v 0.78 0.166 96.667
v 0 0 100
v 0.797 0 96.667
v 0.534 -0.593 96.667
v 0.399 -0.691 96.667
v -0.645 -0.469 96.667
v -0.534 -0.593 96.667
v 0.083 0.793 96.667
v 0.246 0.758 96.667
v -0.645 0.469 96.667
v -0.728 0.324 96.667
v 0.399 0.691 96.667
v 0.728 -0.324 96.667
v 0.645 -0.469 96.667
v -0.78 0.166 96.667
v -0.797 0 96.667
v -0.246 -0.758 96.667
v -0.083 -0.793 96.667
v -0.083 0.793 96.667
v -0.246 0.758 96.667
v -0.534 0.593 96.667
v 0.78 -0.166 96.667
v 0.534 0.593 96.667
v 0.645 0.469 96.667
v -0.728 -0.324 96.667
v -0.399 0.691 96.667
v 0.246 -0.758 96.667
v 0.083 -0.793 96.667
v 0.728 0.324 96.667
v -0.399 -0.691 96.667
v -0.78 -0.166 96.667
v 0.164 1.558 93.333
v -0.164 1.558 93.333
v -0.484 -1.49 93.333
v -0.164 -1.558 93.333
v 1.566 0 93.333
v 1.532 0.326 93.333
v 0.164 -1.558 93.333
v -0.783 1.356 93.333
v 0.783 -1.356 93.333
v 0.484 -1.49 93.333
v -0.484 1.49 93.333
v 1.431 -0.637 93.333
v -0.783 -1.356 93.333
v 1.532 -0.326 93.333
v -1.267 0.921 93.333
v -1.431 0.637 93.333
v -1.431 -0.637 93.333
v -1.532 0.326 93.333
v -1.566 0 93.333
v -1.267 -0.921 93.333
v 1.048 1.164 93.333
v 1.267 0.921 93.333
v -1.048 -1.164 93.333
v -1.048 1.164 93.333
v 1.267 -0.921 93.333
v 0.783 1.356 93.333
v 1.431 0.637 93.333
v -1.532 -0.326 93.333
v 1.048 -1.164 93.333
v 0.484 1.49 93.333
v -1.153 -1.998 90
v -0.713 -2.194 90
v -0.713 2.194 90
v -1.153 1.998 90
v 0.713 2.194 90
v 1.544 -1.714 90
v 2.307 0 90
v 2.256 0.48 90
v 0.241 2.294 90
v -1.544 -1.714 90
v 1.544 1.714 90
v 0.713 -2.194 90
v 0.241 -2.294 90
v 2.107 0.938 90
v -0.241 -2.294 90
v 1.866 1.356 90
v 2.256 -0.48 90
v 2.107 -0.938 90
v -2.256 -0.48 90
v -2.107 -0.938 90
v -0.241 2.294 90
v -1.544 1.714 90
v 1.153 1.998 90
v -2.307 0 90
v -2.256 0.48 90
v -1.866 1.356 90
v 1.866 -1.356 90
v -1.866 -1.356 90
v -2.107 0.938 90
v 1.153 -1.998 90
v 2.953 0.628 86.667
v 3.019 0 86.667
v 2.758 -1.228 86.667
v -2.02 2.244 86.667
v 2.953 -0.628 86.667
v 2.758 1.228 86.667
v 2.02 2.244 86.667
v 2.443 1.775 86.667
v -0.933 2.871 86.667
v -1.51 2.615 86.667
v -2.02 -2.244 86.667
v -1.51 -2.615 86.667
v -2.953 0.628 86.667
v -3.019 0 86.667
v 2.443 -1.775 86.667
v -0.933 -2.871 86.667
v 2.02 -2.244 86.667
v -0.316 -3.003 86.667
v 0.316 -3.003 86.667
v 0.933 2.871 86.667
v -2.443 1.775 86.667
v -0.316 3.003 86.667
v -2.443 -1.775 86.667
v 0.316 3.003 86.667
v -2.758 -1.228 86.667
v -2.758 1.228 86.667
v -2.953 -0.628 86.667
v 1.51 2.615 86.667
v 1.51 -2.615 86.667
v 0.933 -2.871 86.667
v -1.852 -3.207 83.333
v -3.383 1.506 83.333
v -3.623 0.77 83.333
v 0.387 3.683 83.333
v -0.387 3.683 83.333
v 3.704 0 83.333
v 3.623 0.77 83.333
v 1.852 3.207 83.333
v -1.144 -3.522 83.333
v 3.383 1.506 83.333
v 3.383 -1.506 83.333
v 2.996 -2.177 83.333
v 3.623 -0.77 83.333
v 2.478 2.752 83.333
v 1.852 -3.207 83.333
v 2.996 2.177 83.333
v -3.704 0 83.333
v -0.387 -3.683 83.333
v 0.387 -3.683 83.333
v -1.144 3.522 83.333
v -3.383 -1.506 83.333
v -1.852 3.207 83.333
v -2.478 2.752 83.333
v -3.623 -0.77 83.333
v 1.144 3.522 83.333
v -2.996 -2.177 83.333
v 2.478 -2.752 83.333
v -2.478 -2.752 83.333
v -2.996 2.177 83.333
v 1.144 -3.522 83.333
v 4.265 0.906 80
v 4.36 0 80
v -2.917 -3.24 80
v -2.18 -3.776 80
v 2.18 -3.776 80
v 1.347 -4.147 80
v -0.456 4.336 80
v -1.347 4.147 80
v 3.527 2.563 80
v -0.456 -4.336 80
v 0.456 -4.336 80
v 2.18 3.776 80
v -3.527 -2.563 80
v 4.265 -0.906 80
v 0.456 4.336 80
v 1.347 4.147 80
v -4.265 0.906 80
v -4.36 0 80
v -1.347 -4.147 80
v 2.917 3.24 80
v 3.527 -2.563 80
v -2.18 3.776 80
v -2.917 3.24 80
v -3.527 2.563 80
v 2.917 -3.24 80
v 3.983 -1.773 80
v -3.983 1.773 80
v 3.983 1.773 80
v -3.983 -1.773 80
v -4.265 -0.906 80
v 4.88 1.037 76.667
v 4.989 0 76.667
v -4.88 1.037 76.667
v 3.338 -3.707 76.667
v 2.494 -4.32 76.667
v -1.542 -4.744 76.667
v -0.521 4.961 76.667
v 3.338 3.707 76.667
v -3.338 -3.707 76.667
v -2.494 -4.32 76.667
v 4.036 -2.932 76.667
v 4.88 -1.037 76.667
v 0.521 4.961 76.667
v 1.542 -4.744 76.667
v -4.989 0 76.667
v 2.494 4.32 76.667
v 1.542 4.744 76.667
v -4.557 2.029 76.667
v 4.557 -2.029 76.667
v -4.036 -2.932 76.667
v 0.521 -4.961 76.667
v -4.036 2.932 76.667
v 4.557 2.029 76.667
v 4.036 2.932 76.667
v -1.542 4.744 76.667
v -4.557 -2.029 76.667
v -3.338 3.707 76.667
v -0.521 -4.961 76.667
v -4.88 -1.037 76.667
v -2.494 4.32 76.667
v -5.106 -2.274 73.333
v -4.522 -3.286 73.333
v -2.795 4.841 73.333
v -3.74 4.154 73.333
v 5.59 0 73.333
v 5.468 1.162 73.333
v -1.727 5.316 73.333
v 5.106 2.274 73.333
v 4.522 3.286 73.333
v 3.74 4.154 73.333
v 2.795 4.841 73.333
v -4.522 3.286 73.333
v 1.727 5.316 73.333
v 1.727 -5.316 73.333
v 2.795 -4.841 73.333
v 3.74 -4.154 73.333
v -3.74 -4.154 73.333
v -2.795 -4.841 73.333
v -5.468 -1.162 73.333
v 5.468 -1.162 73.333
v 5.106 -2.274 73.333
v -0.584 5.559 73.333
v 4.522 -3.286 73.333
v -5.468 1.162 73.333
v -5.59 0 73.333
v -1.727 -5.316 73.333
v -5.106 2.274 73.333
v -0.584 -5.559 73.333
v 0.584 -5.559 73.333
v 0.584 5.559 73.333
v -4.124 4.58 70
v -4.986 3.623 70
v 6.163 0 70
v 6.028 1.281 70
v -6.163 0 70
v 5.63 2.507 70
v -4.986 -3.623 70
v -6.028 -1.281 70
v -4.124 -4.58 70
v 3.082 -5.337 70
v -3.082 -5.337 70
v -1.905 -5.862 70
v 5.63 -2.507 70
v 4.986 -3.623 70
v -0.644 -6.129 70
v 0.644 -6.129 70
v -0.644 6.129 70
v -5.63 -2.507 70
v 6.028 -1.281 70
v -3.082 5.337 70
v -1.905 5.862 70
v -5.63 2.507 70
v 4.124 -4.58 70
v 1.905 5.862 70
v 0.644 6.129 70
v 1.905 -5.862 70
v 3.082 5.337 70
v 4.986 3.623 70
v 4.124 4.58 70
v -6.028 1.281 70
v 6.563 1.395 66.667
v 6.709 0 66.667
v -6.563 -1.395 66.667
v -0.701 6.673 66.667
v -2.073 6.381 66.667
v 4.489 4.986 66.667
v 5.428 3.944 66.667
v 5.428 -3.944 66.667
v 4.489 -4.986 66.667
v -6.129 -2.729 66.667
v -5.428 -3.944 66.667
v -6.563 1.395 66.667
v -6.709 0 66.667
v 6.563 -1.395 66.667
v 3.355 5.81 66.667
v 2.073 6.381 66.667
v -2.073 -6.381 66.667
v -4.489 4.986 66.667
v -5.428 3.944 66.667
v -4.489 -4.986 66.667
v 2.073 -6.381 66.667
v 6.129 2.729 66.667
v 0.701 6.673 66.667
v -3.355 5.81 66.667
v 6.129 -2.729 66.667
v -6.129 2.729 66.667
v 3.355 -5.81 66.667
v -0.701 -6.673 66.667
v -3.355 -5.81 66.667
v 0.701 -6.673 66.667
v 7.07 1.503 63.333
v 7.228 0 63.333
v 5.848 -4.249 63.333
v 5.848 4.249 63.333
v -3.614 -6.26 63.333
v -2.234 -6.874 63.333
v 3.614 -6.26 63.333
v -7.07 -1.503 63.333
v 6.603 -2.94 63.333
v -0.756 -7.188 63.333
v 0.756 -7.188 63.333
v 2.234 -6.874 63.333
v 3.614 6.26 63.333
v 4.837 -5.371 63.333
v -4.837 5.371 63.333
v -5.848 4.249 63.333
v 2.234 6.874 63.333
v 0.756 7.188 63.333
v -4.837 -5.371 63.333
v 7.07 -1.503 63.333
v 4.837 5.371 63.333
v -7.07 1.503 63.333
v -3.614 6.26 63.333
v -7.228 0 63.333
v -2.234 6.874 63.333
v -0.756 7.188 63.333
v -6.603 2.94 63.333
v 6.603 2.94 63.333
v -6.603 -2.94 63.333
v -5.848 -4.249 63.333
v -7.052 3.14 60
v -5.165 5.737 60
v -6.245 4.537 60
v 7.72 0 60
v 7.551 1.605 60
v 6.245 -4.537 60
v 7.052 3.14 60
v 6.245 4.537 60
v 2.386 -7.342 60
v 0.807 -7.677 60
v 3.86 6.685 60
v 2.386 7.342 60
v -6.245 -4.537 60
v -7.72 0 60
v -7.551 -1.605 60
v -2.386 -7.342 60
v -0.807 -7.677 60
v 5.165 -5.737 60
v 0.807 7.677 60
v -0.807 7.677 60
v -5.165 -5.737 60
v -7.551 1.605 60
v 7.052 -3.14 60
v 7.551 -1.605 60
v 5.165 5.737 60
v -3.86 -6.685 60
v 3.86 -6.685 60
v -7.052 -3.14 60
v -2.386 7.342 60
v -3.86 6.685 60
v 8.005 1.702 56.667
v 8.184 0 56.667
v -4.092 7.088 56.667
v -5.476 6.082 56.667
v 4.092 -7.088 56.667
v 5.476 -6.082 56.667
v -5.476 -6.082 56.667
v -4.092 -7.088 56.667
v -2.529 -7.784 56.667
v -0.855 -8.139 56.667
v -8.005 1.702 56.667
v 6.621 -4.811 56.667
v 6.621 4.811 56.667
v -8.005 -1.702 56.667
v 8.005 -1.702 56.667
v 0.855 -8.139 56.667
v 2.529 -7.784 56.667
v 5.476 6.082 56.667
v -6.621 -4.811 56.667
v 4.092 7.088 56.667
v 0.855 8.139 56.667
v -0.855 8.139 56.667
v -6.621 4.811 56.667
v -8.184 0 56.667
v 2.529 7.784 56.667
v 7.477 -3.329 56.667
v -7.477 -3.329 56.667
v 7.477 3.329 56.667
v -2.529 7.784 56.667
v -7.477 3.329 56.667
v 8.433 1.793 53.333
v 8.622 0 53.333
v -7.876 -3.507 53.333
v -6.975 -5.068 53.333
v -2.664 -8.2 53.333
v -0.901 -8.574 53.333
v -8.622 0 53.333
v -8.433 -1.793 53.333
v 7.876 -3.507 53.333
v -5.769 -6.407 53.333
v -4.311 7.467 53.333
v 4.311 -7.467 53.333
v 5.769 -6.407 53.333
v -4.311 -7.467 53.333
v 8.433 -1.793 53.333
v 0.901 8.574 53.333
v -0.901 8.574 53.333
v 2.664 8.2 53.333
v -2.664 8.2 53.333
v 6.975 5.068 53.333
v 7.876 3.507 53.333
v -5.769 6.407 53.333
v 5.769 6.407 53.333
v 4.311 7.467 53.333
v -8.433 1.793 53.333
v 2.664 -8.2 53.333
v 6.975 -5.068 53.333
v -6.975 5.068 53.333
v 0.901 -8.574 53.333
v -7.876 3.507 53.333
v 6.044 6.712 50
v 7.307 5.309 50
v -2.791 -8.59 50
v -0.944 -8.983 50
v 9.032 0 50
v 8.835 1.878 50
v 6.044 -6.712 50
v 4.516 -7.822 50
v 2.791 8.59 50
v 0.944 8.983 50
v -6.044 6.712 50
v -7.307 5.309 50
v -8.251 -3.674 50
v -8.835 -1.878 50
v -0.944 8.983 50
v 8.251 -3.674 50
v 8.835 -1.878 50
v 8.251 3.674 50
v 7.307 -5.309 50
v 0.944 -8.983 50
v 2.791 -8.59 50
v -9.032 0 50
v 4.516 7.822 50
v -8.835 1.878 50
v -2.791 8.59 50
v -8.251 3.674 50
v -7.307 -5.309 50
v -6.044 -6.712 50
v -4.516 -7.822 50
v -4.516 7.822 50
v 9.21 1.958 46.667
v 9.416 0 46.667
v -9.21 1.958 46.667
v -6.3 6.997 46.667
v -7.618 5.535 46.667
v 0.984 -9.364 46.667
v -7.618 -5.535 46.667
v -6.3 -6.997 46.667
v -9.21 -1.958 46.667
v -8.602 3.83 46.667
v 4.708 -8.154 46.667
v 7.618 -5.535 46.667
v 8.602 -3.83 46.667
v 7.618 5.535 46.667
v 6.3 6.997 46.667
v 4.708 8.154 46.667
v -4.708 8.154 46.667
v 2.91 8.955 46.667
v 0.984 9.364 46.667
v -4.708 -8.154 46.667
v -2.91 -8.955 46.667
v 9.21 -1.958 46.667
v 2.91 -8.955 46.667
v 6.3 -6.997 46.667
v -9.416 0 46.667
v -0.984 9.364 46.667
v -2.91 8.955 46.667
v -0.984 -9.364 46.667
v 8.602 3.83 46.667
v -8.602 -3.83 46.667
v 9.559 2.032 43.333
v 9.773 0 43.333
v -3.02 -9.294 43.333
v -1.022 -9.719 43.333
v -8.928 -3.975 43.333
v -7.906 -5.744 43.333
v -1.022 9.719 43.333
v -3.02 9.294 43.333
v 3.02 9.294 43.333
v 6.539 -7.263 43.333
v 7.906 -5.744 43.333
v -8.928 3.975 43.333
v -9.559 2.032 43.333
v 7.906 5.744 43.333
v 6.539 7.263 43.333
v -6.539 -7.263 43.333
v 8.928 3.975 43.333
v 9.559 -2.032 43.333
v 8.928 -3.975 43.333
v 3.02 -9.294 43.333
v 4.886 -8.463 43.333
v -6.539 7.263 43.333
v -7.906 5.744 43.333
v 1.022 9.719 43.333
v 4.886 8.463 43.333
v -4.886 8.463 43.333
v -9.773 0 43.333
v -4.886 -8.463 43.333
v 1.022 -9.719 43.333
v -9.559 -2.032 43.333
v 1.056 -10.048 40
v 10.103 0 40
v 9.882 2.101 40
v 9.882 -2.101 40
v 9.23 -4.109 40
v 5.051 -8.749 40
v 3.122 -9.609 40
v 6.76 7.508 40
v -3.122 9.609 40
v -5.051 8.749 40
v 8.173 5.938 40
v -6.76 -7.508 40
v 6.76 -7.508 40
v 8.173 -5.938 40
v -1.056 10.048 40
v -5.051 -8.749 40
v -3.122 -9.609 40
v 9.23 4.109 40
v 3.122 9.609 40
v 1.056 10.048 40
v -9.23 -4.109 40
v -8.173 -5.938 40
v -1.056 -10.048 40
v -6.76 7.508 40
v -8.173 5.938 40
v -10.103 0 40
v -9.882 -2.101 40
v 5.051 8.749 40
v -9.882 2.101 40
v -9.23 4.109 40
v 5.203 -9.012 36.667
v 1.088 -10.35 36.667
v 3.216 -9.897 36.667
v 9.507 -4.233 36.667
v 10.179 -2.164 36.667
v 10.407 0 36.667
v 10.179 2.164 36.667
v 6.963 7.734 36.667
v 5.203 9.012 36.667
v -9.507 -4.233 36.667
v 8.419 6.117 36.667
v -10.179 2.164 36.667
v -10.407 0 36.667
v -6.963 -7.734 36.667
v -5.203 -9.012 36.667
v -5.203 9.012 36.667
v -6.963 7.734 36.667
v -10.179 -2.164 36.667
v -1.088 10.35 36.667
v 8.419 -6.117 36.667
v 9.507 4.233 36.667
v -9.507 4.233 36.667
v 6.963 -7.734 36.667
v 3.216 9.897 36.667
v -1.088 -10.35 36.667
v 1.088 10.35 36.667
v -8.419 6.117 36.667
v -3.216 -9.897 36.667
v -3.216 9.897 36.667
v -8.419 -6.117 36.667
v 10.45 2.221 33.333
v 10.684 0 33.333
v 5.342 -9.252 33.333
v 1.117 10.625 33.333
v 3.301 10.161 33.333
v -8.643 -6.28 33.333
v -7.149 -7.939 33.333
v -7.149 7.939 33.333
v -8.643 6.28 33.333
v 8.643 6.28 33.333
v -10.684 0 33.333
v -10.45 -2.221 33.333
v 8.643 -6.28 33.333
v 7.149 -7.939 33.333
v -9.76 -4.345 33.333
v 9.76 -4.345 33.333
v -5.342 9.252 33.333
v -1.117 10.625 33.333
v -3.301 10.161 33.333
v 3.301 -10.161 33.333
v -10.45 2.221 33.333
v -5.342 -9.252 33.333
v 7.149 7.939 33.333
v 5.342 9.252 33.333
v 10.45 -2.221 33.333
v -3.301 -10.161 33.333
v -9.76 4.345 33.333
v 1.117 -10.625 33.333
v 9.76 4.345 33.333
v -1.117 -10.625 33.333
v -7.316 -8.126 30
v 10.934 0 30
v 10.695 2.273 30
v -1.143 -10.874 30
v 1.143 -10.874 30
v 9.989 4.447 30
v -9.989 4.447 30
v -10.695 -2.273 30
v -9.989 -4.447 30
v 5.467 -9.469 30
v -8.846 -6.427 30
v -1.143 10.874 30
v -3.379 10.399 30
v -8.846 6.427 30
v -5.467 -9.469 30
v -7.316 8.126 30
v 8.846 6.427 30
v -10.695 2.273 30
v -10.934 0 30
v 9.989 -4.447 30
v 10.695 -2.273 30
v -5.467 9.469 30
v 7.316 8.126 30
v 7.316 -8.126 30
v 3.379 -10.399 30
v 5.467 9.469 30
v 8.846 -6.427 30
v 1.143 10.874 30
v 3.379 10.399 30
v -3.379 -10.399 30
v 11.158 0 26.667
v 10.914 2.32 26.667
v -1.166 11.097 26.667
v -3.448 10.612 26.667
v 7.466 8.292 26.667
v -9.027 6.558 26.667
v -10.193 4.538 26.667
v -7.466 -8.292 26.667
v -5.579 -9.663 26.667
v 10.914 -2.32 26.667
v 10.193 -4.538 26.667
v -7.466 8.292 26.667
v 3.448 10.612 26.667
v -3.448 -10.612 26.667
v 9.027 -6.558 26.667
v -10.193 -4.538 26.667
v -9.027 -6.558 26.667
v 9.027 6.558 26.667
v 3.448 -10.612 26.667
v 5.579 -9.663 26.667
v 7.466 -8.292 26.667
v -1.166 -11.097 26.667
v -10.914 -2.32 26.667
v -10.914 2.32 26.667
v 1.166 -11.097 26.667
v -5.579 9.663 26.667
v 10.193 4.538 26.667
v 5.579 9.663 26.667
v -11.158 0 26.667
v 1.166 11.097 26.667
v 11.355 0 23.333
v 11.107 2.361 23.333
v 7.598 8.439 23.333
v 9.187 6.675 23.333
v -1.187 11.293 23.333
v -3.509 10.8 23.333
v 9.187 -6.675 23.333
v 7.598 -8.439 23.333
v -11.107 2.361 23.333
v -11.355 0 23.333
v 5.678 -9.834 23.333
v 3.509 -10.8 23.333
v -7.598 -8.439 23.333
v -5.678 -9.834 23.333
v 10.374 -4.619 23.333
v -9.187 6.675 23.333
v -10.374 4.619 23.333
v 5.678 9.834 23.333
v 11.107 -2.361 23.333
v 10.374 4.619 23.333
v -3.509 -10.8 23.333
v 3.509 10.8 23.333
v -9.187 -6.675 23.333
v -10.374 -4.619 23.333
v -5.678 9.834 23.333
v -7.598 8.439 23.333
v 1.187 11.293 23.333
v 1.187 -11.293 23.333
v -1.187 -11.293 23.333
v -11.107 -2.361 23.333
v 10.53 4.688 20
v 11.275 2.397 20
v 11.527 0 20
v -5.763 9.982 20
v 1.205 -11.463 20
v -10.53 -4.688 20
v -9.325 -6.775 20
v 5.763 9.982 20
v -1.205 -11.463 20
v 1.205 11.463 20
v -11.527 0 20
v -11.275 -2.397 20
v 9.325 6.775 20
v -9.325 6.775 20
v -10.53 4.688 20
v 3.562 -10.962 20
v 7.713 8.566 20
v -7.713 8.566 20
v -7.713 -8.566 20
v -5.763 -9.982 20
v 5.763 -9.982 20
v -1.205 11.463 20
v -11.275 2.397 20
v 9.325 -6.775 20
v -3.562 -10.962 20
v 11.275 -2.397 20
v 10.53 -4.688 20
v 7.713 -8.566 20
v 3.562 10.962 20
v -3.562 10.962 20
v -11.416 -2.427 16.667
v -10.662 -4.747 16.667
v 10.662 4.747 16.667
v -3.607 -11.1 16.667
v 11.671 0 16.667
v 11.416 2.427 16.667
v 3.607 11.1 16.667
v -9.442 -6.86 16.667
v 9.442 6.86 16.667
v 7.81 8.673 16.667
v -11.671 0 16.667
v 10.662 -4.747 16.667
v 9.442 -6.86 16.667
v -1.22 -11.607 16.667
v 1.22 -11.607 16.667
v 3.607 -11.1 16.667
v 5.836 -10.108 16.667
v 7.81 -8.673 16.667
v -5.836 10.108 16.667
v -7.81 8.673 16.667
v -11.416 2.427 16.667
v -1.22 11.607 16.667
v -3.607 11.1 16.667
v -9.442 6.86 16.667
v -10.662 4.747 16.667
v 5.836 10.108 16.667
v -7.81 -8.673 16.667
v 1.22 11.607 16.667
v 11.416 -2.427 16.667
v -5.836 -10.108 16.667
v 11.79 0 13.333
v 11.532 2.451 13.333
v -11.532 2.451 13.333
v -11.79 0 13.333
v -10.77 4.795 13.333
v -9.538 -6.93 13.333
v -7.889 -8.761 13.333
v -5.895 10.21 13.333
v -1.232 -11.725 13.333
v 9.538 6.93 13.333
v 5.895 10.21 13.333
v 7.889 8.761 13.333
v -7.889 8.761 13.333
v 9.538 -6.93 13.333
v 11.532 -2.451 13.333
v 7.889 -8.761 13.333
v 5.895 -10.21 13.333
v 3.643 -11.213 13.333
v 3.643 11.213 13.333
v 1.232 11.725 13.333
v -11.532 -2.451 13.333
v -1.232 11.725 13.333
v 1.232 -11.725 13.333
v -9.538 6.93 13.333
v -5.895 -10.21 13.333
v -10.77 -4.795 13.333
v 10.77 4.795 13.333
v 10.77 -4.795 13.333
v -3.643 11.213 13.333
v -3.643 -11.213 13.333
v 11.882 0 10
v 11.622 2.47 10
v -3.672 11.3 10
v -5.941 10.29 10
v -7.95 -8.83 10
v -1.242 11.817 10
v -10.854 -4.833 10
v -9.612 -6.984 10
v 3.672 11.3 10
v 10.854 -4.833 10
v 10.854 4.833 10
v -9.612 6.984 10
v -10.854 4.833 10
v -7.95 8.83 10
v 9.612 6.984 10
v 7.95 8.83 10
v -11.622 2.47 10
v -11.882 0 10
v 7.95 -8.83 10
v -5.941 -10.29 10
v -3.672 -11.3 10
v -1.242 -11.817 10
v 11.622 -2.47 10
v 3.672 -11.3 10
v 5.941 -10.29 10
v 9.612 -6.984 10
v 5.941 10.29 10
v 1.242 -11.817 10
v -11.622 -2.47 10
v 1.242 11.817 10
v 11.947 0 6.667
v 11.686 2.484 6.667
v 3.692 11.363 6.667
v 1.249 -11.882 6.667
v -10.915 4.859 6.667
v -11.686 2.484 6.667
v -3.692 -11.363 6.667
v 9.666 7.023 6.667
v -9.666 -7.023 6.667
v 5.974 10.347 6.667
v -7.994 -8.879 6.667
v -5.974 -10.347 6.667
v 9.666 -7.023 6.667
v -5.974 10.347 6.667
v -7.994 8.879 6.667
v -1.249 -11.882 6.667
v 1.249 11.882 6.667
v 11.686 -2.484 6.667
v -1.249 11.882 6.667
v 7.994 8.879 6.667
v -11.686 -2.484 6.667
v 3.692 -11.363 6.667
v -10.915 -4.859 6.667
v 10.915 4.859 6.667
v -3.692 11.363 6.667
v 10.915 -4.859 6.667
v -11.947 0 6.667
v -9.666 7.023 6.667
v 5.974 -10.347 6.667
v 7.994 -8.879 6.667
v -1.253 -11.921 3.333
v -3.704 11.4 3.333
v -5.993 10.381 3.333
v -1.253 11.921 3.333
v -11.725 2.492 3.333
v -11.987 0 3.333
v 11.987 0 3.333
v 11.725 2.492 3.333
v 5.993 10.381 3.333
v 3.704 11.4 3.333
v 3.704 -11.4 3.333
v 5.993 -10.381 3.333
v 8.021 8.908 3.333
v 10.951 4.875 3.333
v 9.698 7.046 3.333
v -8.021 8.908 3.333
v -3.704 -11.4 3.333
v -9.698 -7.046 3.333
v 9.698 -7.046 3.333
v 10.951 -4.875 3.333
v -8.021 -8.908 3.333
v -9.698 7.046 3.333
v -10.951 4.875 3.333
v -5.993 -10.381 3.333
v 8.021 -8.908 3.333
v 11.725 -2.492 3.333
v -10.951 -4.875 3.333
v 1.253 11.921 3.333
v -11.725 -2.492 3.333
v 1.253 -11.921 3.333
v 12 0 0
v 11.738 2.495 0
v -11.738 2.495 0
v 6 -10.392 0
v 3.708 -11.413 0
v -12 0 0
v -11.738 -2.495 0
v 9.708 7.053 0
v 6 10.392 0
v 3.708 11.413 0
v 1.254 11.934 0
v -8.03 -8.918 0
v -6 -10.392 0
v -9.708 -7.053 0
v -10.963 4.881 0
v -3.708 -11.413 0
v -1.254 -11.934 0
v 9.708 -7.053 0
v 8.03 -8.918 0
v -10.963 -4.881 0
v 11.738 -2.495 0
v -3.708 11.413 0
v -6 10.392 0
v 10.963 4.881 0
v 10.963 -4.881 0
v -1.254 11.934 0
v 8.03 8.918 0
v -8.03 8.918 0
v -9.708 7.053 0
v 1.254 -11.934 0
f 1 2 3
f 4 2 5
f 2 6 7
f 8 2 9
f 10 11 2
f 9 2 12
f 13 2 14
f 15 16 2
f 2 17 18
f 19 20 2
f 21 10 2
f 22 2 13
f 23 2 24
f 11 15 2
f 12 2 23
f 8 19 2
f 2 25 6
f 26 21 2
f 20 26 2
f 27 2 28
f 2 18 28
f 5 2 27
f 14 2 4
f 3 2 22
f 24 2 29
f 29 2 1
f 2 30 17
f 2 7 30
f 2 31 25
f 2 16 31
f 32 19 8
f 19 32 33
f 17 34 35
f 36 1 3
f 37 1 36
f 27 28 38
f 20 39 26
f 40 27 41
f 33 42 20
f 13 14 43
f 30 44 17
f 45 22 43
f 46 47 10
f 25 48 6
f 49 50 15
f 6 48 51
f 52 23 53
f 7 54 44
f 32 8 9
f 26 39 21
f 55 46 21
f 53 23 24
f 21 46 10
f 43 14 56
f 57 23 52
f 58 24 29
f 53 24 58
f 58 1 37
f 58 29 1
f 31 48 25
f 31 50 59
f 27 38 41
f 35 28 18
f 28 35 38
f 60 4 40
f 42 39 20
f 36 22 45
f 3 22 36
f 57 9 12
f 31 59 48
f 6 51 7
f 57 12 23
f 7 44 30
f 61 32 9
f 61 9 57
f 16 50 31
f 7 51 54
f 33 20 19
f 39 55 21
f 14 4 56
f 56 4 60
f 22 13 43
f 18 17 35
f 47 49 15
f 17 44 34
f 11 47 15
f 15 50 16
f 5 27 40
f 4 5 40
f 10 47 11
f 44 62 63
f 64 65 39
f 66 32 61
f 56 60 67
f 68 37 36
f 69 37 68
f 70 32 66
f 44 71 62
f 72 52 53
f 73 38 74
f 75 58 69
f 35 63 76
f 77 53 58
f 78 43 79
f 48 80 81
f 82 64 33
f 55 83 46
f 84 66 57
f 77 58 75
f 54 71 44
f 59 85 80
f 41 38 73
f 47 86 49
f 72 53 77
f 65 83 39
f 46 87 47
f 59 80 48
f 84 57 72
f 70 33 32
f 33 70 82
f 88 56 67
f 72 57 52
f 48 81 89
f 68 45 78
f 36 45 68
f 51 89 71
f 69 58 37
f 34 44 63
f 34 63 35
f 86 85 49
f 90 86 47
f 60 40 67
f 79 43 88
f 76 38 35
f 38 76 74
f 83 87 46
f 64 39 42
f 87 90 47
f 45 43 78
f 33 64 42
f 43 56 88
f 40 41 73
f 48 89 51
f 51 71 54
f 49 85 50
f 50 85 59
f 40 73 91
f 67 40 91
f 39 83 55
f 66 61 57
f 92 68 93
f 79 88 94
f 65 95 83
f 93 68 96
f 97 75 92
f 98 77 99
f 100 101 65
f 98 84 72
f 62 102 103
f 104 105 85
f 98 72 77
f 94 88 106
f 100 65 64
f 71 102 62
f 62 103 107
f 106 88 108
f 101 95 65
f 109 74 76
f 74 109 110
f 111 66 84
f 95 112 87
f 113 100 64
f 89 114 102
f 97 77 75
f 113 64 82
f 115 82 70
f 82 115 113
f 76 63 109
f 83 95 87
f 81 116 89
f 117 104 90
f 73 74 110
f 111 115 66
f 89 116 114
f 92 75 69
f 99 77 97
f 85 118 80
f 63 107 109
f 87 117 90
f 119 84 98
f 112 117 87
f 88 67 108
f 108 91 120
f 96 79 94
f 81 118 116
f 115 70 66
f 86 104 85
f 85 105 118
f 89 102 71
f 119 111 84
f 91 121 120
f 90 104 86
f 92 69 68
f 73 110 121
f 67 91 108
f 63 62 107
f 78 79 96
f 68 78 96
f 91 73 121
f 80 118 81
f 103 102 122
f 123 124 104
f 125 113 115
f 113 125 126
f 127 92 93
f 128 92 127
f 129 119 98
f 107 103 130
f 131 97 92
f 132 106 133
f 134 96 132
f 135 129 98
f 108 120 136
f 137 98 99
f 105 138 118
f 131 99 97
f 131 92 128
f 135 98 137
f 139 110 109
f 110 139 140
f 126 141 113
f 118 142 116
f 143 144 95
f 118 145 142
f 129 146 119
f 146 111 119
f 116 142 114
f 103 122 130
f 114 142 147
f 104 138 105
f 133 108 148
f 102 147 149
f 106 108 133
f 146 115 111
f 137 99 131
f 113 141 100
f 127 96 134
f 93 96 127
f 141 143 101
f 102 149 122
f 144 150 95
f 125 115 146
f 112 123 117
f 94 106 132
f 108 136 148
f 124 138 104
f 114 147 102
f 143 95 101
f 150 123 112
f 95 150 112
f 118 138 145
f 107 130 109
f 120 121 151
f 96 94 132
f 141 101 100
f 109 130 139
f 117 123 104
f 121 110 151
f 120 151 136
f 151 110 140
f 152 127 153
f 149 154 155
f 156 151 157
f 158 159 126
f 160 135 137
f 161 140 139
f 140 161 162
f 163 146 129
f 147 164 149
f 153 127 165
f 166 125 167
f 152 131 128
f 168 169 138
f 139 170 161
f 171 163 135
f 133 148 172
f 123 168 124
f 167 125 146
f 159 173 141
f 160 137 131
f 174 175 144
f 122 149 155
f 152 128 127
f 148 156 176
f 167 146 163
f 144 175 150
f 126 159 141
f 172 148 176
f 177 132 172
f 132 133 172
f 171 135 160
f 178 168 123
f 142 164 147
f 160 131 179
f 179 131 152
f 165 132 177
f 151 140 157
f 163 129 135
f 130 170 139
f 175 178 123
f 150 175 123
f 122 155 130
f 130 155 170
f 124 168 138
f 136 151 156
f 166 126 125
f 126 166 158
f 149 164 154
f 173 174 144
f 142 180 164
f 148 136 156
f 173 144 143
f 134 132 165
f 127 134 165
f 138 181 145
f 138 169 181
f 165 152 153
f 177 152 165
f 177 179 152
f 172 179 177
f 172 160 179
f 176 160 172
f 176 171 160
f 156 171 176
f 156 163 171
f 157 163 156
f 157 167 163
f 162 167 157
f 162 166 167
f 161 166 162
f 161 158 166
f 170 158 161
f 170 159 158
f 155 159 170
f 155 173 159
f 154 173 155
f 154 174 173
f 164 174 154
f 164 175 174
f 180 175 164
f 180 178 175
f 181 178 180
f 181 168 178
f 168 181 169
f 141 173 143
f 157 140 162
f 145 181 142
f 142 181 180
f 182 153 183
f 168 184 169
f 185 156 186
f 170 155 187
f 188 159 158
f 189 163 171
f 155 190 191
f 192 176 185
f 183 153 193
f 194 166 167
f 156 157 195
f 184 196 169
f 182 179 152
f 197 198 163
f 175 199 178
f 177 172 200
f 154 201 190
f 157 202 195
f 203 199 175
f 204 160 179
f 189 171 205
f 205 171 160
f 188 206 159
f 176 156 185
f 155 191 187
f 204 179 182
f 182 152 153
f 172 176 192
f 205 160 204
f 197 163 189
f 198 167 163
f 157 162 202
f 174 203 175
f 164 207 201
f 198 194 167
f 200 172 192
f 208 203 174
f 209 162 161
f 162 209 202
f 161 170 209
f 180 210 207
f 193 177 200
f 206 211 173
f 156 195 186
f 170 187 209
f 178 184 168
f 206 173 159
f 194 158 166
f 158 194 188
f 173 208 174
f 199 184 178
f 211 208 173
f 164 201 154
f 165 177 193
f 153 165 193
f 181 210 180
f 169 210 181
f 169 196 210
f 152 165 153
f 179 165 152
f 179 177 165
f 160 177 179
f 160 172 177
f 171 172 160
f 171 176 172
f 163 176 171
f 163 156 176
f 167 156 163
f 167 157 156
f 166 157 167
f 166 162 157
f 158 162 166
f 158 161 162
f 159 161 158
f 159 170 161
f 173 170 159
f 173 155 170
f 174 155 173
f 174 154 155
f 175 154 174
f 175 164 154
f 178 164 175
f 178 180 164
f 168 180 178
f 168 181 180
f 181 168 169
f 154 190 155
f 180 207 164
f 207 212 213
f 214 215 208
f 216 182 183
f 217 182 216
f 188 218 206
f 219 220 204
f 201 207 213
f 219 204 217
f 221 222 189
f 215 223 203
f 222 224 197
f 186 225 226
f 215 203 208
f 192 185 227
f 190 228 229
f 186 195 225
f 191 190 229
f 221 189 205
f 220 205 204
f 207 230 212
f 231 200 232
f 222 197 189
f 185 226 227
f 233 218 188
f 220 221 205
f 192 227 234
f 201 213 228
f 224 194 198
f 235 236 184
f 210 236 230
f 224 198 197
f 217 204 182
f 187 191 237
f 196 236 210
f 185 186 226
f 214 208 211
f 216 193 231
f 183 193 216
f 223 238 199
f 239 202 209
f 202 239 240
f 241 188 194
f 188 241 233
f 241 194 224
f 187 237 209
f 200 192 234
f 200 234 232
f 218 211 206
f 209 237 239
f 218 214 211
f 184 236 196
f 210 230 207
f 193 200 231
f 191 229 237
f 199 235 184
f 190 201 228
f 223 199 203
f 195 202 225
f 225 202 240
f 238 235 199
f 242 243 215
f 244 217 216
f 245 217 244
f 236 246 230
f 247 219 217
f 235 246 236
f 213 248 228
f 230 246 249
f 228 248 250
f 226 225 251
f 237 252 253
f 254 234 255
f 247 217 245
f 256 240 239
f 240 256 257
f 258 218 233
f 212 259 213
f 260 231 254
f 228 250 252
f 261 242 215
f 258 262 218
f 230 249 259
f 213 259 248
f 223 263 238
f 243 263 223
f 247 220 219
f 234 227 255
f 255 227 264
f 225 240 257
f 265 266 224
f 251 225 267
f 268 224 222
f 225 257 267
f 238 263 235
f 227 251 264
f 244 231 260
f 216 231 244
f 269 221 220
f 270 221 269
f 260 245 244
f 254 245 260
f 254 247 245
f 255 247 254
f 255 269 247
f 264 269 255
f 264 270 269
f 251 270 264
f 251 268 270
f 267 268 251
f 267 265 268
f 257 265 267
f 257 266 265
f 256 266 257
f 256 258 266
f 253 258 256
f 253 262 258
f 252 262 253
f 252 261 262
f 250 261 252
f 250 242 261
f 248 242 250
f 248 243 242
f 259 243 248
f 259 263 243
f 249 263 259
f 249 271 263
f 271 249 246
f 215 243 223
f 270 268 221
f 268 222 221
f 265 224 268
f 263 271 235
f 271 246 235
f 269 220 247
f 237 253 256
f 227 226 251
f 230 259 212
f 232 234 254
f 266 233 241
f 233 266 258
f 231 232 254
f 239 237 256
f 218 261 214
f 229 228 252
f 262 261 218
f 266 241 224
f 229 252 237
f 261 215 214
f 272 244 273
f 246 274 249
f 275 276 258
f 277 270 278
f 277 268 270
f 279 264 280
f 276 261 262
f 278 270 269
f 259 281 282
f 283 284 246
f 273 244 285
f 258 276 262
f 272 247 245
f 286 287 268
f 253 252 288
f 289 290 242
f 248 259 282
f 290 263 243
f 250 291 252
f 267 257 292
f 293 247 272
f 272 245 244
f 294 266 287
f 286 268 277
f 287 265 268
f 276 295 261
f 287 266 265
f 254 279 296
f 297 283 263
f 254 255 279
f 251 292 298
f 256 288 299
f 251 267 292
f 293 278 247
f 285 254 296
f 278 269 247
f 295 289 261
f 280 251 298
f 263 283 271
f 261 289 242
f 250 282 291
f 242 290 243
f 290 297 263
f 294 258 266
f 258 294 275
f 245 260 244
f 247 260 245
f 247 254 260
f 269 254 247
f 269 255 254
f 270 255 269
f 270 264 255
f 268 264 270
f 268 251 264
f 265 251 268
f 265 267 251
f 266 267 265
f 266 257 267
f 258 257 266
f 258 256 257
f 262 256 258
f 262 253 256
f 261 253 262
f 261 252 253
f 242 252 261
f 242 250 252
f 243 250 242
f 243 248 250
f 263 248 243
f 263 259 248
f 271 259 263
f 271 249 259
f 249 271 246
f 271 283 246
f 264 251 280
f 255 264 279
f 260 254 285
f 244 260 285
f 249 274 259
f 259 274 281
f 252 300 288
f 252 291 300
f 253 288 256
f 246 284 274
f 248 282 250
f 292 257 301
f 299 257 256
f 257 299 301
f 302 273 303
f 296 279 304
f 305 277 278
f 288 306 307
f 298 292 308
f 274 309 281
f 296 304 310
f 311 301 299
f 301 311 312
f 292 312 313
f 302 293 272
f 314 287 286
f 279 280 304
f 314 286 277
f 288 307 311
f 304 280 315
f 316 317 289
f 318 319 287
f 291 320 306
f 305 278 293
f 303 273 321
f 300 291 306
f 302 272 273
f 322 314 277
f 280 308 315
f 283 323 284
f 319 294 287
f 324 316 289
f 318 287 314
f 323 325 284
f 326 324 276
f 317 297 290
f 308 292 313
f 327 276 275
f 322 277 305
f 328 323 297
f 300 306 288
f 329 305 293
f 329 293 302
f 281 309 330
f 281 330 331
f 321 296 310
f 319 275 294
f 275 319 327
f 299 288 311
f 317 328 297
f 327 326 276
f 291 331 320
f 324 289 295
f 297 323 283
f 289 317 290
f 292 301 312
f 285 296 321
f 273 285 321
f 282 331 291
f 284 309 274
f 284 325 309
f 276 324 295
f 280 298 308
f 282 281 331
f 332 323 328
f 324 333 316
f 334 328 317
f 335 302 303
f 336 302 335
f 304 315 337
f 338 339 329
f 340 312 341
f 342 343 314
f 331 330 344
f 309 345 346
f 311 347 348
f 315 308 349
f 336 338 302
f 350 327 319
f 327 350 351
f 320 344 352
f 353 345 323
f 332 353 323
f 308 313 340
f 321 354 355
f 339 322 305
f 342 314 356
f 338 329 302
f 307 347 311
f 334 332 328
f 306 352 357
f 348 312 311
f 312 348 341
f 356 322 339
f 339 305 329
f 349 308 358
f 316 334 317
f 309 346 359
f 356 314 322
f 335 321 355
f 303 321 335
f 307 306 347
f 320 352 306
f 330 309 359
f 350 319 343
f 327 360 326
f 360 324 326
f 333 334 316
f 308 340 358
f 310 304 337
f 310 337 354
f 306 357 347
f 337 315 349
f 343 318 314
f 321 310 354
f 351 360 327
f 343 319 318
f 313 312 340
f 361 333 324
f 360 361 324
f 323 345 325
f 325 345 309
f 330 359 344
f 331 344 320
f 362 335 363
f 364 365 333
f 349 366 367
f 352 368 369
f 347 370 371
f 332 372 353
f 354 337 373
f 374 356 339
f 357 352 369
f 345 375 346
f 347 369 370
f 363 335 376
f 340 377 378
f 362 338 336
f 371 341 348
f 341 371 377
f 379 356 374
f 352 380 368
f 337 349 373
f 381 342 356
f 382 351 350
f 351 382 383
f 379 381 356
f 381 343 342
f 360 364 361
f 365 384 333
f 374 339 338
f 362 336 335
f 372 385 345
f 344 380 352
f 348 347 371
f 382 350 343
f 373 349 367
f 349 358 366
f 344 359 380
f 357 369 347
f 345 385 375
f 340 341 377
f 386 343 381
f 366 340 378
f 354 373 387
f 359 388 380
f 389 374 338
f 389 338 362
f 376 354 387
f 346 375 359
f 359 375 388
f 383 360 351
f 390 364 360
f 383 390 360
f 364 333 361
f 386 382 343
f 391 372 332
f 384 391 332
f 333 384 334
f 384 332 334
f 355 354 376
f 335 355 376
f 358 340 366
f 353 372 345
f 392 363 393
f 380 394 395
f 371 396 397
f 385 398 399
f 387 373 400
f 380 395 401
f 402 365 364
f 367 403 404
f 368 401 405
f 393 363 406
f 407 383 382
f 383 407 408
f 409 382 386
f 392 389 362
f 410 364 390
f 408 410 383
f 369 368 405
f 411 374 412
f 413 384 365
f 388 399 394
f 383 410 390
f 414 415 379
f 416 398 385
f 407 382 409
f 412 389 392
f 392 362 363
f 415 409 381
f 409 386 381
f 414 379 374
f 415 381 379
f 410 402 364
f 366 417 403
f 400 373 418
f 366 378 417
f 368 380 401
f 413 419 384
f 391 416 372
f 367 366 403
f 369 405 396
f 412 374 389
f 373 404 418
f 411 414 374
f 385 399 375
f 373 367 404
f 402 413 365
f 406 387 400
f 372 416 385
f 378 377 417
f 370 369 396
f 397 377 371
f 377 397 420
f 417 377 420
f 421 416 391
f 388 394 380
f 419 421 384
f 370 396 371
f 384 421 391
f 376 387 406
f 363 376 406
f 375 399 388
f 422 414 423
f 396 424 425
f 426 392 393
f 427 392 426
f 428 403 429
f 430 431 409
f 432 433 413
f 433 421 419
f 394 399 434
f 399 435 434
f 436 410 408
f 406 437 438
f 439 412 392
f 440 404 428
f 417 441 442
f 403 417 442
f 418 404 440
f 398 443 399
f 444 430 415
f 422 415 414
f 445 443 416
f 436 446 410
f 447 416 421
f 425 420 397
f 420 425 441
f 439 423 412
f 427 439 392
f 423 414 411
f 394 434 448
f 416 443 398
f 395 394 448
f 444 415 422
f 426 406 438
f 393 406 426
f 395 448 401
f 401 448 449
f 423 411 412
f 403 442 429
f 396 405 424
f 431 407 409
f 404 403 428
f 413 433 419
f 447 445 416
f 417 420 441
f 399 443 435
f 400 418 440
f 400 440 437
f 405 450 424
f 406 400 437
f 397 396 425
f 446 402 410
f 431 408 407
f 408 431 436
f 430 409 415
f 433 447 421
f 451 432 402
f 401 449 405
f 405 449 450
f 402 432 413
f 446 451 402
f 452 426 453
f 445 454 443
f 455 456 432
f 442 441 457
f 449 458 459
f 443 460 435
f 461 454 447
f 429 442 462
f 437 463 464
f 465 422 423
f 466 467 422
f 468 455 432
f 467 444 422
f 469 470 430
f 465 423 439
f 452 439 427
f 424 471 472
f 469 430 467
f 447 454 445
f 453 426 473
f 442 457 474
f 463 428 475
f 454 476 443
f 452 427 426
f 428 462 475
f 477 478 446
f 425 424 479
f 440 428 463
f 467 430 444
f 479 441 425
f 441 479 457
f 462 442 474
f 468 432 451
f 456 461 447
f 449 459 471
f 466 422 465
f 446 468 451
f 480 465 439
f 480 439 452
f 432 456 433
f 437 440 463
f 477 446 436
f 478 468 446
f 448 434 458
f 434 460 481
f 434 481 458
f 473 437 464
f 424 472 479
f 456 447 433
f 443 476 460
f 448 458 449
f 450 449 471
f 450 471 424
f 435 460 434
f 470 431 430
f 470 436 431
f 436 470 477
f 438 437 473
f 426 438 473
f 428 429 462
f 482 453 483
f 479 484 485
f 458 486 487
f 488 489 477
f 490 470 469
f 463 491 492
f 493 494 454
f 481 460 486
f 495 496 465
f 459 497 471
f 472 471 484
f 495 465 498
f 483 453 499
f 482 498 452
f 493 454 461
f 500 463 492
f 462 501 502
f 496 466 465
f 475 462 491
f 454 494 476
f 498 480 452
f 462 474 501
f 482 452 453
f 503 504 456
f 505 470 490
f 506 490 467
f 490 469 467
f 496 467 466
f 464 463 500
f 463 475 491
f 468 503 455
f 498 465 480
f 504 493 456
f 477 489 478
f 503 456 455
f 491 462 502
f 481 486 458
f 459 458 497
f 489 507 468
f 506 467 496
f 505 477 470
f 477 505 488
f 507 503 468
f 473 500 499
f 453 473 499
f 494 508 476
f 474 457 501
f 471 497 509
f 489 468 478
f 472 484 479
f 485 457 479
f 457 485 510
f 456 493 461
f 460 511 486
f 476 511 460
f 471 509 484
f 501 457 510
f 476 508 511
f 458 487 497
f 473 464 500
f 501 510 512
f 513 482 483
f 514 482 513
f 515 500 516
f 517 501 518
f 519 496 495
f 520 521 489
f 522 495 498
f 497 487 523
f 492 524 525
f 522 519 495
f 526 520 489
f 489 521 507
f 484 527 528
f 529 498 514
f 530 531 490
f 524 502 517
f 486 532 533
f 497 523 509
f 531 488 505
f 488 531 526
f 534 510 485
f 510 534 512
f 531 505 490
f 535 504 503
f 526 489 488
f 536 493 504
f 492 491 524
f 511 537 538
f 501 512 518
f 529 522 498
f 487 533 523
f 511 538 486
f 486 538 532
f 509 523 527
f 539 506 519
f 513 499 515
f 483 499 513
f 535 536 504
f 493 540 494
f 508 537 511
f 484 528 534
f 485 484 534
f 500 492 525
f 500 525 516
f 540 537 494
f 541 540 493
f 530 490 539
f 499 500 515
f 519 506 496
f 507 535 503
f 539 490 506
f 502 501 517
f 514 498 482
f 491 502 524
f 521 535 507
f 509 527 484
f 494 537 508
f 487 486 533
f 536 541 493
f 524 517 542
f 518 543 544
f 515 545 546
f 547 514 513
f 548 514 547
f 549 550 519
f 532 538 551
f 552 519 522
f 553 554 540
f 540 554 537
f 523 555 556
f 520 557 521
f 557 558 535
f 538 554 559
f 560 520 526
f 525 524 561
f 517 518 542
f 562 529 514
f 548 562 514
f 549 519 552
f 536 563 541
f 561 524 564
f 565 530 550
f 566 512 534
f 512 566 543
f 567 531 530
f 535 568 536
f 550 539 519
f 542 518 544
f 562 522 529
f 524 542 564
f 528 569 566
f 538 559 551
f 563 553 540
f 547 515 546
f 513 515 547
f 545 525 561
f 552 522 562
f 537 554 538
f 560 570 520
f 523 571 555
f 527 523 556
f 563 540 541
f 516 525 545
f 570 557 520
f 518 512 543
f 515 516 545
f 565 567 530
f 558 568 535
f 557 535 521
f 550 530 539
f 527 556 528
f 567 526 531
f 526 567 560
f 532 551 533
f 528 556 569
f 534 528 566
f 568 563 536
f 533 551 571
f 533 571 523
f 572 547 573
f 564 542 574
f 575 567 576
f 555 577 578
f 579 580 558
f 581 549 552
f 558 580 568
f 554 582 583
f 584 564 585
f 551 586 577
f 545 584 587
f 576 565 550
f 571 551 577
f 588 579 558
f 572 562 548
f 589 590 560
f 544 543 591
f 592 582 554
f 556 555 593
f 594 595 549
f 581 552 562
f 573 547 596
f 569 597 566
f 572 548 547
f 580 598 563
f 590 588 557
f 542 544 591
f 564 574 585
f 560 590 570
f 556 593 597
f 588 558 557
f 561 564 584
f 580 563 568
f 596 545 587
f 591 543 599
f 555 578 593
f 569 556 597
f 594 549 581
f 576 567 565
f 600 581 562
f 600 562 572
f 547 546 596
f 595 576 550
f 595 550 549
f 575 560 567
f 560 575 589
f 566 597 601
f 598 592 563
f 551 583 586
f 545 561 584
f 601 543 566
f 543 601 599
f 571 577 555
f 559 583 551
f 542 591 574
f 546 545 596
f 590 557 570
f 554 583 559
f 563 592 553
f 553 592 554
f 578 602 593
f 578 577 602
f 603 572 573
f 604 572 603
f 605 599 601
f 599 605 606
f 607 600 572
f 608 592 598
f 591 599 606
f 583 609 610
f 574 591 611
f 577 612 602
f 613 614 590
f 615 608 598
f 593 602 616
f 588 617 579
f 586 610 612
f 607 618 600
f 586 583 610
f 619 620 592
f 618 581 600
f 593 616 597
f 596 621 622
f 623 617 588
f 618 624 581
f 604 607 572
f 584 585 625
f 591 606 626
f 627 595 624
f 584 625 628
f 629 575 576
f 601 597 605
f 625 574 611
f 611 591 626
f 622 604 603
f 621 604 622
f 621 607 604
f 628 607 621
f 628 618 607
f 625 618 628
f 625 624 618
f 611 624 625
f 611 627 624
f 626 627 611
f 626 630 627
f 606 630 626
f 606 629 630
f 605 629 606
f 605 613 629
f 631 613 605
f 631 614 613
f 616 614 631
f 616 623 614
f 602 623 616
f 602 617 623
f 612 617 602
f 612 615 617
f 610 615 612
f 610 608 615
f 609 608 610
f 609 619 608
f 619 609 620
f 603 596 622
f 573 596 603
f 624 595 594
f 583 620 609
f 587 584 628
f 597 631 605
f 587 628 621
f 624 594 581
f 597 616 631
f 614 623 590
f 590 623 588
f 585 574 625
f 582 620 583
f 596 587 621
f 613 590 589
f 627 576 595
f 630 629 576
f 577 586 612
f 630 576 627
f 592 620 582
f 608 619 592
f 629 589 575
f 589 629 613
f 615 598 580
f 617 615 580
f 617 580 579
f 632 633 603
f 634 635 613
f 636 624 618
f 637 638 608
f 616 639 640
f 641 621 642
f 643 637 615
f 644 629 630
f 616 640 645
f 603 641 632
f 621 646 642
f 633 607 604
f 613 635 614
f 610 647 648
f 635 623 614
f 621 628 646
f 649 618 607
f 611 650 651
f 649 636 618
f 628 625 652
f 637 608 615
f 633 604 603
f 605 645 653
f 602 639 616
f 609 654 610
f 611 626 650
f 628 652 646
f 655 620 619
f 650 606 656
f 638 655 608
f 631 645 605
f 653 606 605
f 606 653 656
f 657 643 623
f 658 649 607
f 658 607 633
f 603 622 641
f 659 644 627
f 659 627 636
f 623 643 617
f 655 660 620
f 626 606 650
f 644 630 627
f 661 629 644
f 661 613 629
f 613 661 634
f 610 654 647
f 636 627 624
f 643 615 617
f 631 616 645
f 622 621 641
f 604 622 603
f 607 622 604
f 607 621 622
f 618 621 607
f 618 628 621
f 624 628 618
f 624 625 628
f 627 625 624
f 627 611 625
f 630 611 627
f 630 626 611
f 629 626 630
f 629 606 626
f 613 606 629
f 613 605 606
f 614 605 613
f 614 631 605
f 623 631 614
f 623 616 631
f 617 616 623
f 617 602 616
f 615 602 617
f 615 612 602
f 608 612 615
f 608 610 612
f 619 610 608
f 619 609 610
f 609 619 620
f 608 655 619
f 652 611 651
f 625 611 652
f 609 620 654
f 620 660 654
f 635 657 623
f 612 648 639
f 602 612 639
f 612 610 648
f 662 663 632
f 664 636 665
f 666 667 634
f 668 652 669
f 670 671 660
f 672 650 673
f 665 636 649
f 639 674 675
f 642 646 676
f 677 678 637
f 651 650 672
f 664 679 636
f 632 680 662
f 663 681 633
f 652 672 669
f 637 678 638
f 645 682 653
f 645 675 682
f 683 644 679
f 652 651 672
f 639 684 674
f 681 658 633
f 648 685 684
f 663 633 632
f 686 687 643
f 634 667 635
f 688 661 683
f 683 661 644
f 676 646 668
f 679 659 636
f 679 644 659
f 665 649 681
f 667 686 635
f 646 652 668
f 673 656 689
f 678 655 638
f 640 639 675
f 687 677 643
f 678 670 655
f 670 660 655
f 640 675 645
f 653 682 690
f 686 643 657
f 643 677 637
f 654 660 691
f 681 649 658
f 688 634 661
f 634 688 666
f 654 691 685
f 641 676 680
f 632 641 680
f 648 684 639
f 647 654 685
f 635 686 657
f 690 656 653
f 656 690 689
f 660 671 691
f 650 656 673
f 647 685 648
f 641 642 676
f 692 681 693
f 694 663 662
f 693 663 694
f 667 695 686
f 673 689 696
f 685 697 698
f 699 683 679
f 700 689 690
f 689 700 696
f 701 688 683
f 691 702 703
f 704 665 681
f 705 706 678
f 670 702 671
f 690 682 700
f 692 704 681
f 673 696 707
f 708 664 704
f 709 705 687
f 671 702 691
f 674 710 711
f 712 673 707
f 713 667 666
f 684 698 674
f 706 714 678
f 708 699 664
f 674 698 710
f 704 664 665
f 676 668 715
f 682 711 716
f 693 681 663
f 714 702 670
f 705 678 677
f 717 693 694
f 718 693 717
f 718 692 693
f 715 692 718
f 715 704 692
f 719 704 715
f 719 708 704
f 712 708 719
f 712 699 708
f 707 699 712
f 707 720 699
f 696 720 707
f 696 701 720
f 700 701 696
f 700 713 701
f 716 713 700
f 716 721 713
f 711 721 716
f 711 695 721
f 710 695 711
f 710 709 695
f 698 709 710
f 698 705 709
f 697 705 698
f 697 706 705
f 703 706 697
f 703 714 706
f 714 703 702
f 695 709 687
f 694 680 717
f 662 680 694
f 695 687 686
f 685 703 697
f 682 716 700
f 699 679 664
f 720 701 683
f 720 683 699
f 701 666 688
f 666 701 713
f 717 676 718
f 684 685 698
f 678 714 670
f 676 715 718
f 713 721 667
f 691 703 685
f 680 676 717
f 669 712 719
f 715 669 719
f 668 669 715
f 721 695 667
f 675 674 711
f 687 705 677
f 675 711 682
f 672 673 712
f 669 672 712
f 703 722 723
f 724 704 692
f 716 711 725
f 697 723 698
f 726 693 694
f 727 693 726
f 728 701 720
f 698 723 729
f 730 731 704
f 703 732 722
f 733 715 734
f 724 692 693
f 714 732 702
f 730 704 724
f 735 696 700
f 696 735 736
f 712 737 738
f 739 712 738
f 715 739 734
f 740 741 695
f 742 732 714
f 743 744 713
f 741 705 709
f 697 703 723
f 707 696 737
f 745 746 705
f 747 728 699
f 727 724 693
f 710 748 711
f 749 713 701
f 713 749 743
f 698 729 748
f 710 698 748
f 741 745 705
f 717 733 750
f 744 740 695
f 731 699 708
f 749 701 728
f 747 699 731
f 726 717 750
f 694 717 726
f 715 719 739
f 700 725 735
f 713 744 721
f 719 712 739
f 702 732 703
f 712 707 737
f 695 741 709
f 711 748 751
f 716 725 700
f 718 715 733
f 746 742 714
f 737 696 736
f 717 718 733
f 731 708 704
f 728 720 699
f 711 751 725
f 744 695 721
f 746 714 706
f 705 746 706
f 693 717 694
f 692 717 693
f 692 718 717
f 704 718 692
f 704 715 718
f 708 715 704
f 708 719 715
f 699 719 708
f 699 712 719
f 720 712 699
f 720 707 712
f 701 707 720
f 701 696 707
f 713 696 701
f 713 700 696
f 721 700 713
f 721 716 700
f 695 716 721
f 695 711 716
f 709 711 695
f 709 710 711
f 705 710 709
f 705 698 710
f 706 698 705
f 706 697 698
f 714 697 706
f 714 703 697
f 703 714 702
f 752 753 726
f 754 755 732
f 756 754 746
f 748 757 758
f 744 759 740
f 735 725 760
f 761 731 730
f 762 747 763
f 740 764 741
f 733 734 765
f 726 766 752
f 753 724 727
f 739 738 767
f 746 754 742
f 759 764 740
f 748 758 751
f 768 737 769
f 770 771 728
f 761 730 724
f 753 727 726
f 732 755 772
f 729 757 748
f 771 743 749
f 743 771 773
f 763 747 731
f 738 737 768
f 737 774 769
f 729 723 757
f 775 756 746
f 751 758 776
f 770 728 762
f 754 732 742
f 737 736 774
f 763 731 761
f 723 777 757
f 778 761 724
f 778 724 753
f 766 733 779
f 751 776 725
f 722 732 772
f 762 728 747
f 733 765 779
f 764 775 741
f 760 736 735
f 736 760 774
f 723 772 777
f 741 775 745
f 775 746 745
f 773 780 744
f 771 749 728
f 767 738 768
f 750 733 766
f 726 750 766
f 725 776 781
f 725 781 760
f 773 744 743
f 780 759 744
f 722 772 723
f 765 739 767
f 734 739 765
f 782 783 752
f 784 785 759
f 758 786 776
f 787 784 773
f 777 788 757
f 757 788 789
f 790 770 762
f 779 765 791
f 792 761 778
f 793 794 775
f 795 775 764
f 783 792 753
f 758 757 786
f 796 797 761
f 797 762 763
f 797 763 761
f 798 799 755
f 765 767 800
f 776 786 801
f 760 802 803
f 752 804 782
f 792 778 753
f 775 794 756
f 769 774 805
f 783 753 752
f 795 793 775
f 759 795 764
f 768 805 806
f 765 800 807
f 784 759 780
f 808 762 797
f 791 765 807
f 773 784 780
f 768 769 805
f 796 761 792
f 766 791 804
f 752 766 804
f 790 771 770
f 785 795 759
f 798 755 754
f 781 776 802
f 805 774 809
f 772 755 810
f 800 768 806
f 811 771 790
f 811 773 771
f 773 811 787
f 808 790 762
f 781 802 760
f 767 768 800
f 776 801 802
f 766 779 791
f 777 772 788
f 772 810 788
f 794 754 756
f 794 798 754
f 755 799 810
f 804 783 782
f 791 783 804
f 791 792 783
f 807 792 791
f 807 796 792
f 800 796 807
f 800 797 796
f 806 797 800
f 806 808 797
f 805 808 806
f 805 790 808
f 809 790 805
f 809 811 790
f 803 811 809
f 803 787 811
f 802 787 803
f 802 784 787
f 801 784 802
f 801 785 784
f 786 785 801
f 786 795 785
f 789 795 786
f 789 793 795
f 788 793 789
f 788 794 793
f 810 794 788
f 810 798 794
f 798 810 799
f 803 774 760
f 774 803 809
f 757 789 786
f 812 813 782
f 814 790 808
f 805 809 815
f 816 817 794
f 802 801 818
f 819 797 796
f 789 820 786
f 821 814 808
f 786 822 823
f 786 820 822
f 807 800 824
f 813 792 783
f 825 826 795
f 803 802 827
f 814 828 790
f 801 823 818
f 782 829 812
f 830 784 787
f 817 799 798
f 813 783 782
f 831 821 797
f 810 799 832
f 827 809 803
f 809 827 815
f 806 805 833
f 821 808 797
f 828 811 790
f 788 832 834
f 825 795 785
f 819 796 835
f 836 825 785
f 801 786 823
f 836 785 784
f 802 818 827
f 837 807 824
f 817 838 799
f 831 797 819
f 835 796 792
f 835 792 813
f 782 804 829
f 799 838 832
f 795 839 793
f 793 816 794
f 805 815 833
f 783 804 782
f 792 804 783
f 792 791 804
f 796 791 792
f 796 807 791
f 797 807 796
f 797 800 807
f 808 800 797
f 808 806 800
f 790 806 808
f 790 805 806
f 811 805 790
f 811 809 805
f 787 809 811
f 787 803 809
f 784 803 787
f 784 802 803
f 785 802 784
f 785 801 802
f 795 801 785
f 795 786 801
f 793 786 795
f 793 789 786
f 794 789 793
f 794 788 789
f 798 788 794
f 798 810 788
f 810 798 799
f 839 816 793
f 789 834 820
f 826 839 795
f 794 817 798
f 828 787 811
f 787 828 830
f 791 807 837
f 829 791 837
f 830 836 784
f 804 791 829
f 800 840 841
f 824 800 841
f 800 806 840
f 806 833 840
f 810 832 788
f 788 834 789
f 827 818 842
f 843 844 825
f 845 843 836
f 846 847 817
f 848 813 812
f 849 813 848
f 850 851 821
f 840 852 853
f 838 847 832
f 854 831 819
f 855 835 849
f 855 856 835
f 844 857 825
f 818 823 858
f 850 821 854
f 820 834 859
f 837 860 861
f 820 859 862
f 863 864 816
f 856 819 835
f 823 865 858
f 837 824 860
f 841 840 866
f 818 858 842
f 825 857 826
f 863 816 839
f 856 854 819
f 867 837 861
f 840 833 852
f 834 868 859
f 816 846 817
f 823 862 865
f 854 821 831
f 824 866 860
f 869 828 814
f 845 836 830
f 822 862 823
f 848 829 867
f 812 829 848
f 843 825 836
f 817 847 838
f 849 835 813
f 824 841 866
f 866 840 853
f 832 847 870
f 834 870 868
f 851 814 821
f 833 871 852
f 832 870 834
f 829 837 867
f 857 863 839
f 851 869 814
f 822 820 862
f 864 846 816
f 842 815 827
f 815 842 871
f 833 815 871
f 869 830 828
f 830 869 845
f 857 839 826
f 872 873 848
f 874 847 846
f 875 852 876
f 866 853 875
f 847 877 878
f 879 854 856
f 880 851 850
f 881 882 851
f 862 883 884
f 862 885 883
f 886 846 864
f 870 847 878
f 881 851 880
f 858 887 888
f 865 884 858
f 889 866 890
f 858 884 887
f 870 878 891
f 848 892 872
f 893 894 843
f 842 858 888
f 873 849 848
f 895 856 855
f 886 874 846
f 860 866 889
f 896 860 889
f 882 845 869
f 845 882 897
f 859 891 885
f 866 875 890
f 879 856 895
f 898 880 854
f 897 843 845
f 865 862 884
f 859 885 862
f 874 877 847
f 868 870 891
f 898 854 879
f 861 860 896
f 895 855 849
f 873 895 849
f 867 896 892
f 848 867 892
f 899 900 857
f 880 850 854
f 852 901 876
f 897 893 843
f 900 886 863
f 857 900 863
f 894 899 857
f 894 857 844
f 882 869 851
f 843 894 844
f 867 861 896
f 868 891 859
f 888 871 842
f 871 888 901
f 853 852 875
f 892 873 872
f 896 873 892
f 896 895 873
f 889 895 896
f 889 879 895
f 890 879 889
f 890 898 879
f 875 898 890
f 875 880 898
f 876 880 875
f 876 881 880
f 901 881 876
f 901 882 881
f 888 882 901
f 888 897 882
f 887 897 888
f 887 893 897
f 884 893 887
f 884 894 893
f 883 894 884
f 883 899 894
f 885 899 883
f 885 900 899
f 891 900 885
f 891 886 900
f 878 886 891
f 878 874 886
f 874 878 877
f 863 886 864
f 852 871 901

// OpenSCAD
/* tangent ogive */

/* 
phi = (R^2+ L^2)/ 2R

y= sqrt(phi^2 - (L -x)^2) + R -phi

*/

L= 100;
R=24/2;
nof = 30;


phi = (pow(R,2) + pow(L,2))/ (2*R); 

$fn=30;
H2=L/nof;
x1= 0;
x2=0;
A1=0;
A2= 0;
module ogive()
{

	for (i=[1:nof]) {

assign(x1 = ((L/nof)*(i-1)),
x2 = ((L/nof)*i),
A1= sqrt(pow(phi,2) - pow((L - ((L/nof)*(i-1))), 2) ) + (R - phi),
A2= sqrt(pow(phi,2) - pow((L - ((L/nof)*i)), 2) ) + (R - phi),
H1= (L/nof)*i)
		{
	  translate ([0,0, L- H1]) cylinder (r1 = A2, r2 = A1 , h= H2);
		echo("i=", i ,"h=",H1,"r1:",A1,"r2:", A2, "phi:", phi, "x1:", x1, "x2", x2);
		}
	}
}

ogive();
